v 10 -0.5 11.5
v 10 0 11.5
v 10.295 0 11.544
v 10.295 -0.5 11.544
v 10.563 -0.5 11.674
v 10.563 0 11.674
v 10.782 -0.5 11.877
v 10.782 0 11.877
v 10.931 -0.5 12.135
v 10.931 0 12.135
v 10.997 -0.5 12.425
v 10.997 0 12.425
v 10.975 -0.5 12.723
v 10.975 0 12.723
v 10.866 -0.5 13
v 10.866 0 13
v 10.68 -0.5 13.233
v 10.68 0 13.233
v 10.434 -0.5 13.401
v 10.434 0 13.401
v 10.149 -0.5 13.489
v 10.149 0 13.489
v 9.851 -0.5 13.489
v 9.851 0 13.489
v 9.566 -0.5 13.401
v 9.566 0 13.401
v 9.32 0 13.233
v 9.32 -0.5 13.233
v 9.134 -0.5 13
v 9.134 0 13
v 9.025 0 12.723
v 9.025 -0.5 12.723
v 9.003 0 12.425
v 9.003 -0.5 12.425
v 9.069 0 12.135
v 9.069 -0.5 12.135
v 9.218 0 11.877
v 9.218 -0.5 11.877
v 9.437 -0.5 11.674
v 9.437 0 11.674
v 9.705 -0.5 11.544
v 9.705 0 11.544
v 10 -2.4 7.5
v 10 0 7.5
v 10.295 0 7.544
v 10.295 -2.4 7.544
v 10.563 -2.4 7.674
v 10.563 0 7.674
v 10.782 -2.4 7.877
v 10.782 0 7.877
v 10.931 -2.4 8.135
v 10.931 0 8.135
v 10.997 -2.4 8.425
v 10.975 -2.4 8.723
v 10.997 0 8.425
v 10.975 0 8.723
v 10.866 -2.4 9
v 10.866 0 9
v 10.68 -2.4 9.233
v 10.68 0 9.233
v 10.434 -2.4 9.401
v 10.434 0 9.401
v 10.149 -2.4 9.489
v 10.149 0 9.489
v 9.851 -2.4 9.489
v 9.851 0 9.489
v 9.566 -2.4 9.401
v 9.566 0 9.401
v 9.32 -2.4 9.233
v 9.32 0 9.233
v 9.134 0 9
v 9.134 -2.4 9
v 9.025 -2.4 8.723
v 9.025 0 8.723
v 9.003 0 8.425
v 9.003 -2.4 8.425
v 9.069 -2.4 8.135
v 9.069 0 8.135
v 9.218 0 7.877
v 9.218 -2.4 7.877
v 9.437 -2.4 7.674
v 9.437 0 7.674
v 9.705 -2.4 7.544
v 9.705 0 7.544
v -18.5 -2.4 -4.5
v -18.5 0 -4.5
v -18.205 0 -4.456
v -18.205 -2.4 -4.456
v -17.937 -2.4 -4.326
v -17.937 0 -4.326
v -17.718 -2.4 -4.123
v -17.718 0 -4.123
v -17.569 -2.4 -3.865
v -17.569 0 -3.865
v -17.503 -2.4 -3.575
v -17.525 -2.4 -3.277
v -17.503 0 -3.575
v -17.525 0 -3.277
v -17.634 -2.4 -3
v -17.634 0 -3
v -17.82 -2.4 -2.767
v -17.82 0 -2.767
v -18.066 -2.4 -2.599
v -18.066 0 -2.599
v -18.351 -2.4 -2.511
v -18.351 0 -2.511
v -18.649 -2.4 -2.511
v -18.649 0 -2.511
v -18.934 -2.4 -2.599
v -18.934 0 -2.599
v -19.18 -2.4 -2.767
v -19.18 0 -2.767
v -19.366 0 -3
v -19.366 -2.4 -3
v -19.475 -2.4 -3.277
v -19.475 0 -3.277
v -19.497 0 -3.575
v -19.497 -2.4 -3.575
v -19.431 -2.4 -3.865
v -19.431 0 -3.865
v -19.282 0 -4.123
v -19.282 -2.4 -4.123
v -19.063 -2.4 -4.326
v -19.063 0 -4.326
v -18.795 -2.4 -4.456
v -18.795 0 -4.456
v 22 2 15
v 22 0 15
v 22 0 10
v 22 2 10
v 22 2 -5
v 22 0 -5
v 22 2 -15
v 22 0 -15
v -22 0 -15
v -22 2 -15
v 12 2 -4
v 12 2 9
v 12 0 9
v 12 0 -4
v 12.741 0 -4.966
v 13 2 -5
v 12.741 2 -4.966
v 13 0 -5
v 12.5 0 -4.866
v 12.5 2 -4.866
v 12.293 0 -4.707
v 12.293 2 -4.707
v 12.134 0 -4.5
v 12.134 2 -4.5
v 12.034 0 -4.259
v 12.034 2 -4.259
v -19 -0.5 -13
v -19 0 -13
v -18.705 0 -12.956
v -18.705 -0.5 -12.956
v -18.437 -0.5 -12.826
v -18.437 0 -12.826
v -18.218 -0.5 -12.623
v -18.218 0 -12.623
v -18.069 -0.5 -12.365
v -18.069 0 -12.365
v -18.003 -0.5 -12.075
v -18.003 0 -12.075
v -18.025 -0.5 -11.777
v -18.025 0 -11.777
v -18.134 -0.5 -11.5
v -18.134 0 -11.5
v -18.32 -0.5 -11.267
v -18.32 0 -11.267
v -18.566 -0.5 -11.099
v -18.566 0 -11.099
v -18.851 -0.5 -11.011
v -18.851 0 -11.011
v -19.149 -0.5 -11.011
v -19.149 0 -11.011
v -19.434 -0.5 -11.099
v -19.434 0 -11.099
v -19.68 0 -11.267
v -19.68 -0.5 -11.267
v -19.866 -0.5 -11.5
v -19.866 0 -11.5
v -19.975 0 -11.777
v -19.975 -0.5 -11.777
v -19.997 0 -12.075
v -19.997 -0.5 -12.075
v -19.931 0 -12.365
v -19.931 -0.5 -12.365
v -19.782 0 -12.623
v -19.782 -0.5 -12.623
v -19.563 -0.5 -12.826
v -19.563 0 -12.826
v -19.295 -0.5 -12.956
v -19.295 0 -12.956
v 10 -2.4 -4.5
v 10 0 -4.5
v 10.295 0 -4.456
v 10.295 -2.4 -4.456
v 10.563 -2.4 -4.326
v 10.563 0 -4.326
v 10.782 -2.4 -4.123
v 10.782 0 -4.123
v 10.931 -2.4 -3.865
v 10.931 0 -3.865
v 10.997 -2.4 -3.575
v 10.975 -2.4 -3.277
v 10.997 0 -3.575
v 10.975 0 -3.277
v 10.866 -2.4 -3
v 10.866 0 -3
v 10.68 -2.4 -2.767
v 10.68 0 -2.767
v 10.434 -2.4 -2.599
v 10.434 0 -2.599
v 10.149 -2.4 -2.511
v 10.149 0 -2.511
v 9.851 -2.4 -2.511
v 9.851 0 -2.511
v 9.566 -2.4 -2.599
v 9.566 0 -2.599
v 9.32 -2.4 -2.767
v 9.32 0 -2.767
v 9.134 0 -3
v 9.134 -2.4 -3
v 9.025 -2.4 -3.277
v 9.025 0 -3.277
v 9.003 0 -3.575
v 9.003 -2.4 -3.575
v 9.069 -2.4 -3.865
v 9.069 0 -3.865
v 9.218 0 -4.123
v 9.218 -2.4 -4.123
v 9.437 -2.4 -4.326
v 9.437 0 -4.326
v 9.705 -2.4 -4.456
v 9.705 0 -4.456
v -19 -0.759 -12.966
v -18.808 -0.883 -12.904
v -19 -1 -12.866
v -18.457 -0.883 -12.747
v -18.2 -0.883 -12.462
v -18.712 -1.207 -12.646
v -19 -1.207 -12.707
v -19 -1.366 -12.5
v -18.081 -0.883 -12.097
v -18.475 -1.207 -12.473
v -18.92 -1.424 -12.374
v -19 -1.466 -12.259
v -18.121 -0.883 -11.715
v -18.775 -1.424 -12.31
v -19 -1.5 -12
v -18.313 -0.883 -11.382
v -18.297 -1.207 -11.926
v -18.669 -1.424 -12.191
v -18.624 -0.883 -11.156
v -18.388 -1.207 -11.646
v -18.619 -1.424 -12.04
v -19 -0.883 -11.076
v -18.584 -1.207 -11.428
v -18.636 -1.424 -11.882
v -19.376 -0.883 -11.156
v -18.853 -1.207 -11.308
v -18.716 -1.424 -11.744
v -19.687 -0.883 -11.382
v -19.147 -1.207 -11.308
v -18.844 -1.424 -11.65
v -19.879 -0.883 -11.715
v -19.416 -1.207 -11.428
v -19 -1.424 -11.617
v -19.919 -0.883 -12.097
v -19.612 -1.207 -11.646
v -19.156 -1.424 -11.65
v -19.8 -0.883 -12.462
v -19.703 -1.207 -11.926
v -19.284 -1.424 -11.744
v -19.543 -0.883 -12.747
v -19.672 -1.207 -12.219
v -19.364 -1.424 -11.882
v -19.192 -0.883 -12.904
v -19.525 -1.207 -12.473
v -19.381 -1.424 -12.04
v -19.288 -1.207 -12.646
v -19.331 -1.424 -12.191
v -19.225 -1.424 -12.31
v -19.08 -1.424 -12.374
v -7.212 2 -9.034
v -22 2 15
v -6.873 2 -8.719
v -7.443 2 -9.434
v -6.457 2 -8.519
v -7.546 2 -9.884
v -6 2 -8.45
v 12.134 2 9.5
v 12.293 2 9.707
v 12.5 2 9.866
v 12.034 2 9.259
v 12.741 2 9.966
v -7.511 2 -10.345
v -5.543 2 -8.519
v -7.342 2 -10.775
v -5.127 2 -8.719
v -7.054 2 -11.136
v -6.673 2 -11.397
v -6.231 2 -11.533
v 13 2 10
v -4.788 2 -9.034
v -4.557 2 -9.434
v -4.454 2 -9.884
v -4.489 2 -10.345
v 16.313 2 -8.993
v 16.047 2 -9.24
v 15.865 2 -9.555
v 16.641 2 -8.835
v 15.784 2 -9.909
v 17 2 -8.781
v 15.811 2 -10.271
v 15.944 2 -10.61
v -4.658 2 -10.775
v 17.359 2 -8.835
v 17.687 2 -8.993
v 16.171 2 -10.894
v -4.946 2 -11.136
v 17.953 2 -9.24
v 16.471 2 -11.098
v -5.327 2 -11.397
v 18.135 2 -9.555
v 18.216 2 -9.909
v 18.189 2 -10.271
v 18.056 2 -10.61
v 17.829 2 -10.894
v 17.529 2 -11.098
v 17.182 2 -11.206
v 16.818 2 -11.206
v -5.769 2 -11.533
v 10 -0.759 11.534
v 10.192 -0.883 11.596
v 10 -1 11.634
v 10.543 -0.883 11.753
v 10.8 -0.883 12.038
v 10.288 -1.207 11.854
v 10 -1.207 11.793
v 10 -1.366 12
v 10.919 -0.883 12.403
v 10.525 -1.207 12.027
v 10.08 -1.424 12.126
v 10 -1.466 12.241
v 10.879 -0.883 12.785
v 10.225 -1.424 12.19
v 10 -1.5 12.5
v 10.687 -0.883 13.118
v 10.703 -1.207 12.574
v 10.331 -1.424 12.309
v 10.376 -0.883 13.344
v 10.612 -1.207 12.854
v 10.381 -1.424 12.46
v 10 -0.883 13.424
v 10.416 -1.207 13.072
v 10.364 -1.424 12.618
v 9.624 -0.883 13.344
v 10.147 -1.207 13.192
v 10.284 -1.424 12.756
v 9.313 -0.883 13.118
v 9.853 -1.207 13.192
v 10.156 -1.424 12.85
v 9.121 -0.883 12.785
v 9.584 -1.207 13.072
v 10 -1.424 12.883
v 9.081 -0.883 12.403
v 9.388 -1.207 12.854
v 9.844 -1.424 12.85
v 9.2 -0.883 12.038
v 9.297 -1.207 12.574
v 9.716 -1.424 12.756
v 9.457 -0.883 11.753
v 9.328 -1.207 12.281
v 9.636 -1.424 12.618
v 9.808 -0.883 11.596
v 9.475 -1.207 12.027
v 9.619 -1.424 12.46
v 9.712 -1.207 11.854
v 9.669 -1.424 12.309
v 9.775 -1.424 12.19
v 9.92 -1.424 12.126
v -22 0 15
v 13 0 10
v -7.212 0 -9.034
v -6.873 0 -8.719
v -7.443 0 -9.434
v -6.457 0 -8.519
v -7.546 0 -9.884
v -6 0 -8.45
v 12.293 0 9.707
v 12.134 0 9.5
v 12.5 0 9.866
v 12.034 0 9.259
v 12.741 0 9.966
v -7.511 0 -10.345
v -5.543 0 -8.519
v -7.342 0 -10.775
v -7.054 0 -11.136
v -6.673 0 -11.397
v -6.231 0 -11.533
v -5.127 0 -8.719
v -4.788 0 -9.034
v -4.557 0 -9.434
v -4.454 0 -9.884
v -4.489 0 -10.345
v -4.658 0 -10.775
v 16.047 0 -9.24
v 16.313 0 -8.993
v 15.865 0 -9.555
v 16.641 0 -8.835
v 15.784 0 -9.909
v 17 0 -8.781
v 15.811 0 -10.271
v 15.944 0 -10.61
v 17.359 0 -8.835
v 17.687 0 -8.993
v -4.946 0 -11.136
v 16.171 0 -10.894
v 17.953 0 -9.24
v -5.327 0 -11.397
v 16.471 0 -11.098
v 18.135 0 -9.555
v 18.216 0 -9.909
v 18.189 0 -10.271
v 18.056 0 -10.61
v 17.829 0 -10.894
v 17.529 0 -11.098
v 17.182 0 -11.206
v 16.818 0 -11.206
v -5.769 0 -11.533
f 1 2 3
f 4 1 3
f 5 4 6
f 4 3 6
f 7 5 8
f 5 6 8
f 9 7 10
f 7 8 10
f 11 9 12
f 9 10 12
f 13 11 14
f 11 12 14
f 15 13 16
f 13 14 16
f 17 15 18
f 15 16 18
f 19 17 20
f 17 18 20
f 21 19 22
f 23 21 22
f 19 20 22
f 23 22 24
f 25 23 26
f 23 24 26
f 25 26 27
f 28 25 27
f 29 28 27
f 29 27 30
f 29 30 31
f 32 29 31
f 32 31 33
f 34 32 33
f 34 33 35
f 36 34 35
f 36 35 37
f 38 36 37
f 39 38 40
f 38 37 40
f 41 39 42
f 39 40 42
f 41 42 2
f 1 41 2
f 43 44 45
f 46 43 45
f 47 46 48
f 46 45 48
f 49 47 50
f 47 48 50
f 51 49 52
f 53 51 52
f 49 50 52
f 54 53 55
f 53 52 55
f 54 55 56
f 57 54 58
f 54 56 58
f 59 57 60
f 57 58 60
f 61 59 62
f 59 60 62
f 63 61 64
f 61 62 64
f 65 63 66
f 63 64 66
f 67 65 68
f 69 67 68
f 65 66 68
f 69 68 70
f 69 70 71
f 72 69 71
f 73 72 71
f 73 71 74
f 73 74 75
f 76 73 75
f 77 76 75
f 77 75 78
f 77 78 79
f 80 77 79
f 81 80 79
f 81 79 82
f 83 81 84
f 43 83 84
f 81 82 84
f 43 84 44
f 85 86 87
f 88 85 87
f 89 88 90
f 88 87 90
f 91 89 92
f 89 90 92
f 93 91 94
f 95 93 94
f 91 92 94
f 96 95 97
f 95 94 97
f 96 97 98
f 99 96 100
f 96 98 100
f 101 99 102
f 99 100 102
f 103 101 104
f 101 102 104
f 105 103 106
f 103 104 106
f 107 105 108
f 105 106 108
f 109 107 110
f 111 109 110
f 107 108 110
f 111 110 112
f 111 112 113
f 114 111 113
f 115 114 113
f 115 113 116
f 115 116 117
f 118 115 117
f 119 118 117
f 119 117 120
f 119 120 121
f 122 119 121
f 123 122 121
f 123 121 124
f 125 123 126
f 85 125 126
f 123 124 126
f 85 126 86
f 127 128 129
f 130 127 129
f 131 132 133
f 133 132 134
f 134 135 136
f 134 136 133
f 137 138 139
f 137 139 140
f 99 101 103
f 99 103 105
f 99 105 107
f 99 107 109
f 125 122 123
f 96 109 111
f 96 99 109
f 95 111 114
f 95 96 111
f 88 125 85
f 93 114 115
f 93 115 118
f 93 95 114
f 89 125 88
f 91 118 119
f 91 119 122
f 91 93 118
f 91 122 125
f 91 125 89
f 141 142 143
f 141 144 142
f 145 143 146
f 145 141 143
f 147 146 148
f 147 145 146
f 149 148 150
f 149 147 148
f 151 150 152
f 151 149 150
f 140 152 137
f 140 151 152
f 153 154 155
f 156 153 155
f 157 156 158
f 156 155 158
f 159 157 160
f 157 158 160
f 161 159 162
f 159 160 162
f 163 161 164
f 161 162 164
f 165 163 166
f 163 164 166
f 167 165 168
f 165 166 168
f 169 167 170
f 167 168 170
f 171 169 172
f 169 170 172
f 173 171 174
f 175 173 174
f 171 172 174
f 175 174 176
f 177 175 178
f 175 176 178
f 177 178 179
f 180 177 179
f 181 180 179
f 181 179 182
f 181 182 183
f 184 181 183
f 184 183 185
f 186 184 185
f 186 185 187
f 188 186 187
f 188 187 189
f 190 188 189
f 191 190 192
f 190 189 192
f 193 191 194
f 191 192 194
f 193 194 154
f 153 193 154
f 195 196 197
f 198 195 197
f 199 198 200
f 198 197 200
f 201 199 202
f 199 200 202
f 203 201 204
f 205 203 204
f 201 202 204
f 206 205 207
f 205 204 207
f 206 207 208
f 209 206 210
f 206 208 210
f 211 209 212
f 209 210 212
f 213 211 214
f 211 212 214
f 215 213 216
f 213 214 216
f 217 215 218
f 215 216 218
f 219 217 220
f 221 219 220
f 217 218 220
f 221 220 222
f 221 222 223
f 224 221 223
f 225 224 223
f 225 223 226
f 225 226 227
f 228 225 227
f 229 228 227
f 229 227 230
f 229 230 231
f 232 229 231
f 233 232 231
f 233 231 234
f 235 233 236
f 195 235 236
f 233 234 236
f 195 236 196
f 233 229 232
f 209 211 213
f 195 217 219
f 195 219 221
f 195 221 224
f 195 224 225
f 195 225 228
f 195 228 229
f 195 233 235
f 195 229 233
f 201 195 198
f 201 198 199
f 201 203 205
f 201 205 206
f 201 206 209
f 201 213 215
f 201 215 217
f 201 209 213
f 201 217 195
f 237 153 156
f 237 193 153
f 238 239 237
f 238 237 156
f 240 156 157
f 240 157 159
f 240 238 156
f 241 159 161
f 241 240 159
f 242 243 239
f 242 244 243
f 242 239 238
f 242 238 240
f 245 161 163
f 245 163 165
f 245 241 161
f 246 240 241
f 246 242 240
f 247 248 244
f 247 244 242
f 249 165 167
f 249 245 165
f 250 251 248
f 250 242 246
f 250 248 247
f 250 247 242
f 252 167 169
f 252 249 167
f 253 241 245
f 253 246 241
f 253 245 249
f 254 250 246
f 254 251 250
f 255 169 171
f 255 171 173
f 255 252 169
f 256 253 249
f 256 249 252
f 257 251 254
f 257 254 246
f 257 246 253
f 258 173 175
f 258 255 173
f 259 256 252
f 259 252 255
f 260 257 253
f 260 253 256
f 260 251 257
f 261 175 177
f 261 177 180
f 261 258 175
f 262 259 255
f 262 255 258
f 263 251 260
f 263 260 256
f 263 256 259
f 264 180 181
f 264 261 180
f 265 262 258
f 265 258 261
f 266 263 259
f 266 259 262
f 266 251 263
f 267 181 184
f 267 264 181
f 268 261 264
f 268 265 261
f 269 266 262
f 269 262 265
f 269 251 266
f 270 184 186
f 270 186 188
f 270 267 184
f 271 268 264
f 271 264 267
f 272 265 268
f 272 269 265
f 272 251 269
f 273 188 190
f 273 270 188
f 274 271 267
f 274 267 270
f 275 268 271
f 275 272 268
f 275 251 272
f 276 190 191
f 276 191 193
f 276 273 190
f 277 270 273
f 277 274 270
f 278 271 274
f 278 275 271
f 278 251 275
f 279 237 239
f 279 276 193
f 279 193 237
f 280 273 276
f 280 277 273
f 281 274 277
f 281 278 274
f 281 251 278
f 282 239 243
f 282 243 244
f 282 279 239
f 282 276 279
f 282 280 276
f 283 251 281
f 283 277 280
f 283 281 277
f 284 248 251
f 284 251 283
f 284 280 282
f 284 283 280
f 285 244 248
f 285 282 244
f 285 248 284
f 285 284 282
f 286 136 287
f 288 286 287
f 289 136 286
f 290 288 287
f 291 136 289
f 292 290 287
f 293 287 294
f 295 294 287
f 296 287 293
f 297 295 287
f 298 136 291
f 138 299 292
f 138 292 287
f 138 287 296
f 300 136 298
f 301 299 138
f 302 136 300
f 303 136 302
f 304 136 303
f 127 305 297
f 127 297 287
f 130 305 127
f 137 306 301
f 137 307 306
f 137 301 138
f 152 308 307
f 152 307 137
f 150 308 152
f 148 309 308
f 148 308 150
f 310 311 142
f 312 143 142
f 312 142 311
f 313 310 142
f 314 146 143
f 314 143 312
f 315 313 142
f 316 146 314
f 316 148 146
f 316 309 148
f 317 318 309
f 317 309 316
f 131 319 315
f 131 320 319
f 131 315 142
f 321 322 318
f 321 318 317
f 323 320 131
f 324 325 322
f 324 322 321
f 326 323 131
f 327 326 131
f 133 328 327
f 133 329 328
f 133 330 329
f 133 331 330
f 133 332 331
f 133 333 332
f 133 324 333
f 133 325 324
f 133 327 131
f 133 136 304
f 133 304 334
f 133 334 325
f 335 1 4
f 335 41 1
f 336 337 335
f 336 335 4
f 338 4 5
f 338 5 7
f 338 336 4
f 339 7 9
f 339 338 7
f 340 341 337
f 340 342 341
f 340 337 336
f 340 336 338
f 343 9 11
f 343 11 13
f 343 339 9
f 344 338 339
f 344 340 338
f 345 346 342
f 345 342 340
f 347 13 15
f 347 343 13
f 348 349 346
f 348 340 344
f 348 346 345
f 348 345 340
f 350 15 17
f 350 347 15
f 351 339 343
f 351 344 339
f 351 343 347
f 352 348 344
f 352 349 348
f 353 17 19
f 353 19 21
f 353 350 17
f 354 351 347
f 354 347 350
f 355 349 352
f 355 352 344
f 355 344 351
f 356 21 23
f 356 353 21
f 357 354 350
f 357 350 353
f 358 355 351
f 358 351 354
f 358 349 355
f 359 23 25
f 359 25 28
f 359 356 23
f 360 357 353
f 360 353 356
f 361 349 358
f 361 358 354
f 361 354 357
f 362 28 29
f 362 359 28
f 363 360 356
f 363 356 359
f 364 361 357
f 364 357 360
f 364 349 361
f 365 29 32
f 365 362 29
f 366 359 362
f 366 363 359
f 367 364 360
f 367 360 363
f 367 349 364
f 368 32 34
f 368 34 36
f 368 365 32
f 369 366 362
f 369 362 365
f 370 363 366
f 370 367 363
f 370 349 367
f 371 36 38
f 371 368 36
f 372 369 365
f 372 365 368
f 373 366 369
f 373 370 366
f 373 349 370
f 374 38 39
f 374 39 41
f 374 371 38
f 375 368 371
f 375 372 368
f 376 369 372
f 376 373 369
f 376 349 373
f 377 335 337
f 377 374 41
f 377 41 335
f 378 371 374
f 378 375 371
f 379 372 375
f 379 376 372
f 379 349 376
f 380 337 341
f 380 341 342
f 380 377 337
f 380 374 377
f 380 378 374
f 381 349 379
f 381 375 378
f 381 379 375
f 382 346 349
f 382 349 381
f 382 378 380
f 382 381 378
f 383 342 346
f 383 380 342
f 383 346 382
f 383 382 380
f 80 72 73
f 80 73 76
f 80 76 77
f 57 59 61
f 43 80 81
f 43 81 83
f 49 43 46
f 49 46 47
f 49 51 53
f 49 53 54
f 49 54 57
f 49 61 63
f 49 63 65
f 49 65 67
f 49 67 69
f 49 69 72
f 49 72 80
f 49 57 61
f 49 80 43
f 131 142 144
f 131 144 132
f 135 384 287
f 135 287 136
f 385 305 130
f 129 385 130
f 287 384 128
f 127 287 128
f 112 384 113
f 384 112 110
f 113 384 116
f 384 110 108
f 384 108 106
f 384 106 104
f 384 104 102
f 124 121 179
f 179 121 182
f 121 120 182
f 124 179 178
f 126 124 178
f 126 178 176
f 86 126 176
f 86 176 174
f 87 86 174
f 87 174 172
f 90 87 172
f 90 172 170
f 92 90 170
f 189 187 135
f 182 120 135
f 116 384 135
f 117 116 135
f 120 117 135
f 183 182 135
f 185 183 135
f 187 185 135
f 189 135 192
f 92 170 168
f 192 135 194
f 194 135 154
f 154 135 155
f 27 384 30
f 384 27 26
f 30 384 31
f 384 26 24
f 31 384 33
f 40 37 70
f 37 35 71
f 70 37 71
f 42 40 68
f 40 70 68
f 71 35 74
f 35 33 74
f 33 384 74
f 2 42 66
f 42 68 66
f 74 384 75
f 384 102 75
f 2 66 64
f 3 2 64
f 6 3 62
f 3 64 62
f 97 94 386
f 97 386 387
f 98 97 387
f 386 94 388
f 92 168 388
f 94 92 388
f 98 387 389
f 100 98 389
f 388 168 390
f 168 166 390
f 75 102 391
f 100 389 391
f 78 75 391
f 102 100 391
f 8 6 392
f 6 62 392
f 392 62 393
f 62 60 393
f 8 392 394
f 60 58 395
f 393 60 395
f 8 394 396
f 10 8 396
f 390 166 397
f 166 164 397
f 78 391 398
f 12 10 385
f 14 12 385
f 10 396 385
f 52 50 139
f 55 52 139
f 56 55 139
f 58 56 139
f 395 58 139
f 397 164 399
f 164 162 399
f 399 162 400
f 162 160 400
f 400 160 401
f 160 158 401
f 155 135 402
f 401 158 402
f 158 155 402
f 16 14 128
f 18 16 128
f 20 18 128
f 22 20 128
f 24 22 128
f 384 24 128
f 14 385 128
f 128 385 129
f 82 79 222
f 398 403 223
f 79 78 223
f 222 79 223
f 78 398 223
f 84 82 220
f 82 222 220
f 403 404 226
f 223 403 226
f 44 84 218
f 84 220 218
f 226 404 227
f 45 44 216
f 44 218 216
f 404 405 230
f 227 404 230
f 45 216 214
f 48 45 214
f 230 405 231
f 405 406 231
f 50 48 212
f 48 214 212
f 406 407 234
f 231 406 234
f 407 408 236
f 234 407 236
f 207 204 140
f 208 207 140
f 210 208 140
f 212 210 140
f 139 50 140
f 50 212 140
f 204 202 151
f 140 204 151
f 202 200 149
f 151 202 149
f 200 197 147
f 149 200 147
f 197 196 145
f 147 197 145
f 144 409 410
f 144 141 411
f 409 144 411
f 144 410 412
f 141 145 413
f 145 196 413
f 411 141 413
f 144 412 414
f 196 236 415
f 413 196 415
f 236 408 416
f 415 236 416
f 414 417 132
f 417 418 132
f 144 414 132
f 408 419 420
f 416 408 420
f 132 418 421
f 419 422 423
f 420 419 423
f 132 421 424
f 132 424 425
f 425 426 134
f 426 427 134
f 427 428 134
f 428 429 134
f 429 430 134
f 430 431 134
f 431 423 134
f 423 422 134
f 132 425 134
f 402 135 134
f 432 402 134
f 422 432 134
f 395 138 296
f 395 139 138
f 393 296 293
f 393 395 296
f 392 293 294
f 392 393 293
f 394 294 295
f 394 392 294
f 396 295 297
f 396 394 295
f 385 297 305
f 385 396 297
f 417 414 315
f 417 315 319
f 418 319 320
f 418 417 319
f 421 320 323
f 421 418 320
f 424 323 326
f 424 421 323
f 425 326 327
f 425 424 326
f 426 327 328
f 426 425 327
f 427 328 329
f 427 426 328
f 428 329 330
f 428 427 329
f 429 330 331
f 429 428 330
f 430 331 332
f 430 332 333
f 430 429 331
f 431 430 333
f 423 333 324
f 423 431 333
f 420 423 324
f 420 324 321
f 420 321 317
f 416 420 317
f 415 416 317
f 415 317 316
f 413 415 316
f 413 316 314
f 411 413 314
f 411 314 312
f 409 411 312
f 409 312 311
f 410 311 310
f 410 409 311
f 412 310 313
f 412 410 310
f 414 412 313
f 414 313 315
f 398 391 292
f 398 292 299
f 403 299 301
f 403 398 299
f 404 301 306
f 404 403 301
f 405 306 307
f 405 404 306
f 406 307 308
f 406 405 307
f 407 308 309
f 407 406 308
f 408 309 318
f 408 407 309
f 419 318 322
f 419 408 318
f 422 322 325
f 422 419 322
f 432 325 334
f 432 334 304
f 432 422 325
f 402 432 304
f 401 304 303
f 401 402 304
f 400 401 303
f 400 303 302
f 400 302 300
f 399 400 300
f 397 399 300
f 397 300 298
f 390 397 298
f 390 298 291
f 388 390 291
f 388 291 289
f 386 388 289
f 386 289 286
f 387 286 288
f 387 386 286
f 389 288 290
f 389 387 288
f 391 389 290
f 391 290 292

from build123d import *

# Parameters (mm, degrees)
SKETCH1_W           = 44
SKETCH1_H           = 30
SKETCH1_R           = 1.2192
SKETCH1_R_2         = 1.55
BOSS_EXTRUDE1_DEPTH = 2
SKETCH2_R           = 1
BOSS_EXTRUDE2_DEPTH = 1.5
FILLET1_R           = 1
SKETCH4_R           = 1
BOSS_EXTRUDE3_DEPTH = 2.4
SKETCH5_W           = 10
SKETCH5_H           = 15
CUT_EXTRUDE1_DEPTH  = 27.988145546
FILLET2_R           = 1


with BuildPart() as part:
    # Sketch1 → Boss-Extrude1 (new body)
    with BuildSketch(Plane(origin=(0, 0, 0), x_dir=(1, 0, 0), z_dir=(0, 1, 0))):
        Rectangle(SKETCH1_W, SKETCH1_H)
        with Locations(Location((17, 10, 0), (0, 0, 270))):
            Circle(SKETCH1_R, mode=Mode.SUBTRACT)
        with Locations(Location((-6, 10, 0), (0, 0, 270))):
            Circle(SKETCH1_R_2, mode=Mode.SUBTRACT)
    extrude(amount=BOSS_EXTRUDE1_DEPTH)

    # Sketch2 → Boss-Extrude2 (add)
    with BuildSketch(Plane(origin=(0, 0, 0), x_dir=(-1, 0, 0), z_dir=(0, -1, 0))):
        with Locations(Location((19, 12, 0), (0, 0, 90))):
            Circle(SKETCH2_R)
        with Locations(Location((-10, -12.5, 0), (0, 0, 90))):
            Circle(SKETCH2_R)
    extrude(amount=BOSS_EXTRUDE2_DEPTH)

    # Fillet1
    fillet1_edges = [part.edges().sort_by_distance(p)[0] for p in [
        (-19, -1.5, -11),
        (10, -1.5, 13.5),
    ]]
    fillet(fillet1_edges, radius=FILLET1_R)

    # Sketch4 → Boss-Extrude3 (add)
    with BuildSketch(Plane.XZ):
        with Locations(Location((10, 8.5, 0), (0, 0, 270))):
            Circle(SKETCH4_R)
        with Locations(Location((-18.5, -3.5, 0), (0, 0, 270))):
            Circle(SKETCH4_R)
        with Locations(Location((10, -3.5, 0), (0, 0, 270))):
            Circle(SKETCH4_R)
    extrude(amount=BOSS_EXTRUDE3_DEPTH)

    # Sketch5 → Cut-Extrude1 (cut, through all)
    with BuildSketch(Plane(origin=(0, 2, 0), x_dir=(1, 0, 0), z_dir=(0, 1, 0))):
        with Locations((17, -2.5)):
            Rectangle(SKETCH5_W, SKETCH5_H)
    extrude(amount=-CUT_EXTRUDE1_DEPTH, mode=Mode.SUBTRACT)

    # Fillet2
    fillet2_edges = [part.edges().sort_by_distance(p)[0] for p in [
        (12, 1, 10),
        (12, 1, -5),
    ]]
    fillet(fillet2_edges, radius=FILLET2_R)


solid = part.part
